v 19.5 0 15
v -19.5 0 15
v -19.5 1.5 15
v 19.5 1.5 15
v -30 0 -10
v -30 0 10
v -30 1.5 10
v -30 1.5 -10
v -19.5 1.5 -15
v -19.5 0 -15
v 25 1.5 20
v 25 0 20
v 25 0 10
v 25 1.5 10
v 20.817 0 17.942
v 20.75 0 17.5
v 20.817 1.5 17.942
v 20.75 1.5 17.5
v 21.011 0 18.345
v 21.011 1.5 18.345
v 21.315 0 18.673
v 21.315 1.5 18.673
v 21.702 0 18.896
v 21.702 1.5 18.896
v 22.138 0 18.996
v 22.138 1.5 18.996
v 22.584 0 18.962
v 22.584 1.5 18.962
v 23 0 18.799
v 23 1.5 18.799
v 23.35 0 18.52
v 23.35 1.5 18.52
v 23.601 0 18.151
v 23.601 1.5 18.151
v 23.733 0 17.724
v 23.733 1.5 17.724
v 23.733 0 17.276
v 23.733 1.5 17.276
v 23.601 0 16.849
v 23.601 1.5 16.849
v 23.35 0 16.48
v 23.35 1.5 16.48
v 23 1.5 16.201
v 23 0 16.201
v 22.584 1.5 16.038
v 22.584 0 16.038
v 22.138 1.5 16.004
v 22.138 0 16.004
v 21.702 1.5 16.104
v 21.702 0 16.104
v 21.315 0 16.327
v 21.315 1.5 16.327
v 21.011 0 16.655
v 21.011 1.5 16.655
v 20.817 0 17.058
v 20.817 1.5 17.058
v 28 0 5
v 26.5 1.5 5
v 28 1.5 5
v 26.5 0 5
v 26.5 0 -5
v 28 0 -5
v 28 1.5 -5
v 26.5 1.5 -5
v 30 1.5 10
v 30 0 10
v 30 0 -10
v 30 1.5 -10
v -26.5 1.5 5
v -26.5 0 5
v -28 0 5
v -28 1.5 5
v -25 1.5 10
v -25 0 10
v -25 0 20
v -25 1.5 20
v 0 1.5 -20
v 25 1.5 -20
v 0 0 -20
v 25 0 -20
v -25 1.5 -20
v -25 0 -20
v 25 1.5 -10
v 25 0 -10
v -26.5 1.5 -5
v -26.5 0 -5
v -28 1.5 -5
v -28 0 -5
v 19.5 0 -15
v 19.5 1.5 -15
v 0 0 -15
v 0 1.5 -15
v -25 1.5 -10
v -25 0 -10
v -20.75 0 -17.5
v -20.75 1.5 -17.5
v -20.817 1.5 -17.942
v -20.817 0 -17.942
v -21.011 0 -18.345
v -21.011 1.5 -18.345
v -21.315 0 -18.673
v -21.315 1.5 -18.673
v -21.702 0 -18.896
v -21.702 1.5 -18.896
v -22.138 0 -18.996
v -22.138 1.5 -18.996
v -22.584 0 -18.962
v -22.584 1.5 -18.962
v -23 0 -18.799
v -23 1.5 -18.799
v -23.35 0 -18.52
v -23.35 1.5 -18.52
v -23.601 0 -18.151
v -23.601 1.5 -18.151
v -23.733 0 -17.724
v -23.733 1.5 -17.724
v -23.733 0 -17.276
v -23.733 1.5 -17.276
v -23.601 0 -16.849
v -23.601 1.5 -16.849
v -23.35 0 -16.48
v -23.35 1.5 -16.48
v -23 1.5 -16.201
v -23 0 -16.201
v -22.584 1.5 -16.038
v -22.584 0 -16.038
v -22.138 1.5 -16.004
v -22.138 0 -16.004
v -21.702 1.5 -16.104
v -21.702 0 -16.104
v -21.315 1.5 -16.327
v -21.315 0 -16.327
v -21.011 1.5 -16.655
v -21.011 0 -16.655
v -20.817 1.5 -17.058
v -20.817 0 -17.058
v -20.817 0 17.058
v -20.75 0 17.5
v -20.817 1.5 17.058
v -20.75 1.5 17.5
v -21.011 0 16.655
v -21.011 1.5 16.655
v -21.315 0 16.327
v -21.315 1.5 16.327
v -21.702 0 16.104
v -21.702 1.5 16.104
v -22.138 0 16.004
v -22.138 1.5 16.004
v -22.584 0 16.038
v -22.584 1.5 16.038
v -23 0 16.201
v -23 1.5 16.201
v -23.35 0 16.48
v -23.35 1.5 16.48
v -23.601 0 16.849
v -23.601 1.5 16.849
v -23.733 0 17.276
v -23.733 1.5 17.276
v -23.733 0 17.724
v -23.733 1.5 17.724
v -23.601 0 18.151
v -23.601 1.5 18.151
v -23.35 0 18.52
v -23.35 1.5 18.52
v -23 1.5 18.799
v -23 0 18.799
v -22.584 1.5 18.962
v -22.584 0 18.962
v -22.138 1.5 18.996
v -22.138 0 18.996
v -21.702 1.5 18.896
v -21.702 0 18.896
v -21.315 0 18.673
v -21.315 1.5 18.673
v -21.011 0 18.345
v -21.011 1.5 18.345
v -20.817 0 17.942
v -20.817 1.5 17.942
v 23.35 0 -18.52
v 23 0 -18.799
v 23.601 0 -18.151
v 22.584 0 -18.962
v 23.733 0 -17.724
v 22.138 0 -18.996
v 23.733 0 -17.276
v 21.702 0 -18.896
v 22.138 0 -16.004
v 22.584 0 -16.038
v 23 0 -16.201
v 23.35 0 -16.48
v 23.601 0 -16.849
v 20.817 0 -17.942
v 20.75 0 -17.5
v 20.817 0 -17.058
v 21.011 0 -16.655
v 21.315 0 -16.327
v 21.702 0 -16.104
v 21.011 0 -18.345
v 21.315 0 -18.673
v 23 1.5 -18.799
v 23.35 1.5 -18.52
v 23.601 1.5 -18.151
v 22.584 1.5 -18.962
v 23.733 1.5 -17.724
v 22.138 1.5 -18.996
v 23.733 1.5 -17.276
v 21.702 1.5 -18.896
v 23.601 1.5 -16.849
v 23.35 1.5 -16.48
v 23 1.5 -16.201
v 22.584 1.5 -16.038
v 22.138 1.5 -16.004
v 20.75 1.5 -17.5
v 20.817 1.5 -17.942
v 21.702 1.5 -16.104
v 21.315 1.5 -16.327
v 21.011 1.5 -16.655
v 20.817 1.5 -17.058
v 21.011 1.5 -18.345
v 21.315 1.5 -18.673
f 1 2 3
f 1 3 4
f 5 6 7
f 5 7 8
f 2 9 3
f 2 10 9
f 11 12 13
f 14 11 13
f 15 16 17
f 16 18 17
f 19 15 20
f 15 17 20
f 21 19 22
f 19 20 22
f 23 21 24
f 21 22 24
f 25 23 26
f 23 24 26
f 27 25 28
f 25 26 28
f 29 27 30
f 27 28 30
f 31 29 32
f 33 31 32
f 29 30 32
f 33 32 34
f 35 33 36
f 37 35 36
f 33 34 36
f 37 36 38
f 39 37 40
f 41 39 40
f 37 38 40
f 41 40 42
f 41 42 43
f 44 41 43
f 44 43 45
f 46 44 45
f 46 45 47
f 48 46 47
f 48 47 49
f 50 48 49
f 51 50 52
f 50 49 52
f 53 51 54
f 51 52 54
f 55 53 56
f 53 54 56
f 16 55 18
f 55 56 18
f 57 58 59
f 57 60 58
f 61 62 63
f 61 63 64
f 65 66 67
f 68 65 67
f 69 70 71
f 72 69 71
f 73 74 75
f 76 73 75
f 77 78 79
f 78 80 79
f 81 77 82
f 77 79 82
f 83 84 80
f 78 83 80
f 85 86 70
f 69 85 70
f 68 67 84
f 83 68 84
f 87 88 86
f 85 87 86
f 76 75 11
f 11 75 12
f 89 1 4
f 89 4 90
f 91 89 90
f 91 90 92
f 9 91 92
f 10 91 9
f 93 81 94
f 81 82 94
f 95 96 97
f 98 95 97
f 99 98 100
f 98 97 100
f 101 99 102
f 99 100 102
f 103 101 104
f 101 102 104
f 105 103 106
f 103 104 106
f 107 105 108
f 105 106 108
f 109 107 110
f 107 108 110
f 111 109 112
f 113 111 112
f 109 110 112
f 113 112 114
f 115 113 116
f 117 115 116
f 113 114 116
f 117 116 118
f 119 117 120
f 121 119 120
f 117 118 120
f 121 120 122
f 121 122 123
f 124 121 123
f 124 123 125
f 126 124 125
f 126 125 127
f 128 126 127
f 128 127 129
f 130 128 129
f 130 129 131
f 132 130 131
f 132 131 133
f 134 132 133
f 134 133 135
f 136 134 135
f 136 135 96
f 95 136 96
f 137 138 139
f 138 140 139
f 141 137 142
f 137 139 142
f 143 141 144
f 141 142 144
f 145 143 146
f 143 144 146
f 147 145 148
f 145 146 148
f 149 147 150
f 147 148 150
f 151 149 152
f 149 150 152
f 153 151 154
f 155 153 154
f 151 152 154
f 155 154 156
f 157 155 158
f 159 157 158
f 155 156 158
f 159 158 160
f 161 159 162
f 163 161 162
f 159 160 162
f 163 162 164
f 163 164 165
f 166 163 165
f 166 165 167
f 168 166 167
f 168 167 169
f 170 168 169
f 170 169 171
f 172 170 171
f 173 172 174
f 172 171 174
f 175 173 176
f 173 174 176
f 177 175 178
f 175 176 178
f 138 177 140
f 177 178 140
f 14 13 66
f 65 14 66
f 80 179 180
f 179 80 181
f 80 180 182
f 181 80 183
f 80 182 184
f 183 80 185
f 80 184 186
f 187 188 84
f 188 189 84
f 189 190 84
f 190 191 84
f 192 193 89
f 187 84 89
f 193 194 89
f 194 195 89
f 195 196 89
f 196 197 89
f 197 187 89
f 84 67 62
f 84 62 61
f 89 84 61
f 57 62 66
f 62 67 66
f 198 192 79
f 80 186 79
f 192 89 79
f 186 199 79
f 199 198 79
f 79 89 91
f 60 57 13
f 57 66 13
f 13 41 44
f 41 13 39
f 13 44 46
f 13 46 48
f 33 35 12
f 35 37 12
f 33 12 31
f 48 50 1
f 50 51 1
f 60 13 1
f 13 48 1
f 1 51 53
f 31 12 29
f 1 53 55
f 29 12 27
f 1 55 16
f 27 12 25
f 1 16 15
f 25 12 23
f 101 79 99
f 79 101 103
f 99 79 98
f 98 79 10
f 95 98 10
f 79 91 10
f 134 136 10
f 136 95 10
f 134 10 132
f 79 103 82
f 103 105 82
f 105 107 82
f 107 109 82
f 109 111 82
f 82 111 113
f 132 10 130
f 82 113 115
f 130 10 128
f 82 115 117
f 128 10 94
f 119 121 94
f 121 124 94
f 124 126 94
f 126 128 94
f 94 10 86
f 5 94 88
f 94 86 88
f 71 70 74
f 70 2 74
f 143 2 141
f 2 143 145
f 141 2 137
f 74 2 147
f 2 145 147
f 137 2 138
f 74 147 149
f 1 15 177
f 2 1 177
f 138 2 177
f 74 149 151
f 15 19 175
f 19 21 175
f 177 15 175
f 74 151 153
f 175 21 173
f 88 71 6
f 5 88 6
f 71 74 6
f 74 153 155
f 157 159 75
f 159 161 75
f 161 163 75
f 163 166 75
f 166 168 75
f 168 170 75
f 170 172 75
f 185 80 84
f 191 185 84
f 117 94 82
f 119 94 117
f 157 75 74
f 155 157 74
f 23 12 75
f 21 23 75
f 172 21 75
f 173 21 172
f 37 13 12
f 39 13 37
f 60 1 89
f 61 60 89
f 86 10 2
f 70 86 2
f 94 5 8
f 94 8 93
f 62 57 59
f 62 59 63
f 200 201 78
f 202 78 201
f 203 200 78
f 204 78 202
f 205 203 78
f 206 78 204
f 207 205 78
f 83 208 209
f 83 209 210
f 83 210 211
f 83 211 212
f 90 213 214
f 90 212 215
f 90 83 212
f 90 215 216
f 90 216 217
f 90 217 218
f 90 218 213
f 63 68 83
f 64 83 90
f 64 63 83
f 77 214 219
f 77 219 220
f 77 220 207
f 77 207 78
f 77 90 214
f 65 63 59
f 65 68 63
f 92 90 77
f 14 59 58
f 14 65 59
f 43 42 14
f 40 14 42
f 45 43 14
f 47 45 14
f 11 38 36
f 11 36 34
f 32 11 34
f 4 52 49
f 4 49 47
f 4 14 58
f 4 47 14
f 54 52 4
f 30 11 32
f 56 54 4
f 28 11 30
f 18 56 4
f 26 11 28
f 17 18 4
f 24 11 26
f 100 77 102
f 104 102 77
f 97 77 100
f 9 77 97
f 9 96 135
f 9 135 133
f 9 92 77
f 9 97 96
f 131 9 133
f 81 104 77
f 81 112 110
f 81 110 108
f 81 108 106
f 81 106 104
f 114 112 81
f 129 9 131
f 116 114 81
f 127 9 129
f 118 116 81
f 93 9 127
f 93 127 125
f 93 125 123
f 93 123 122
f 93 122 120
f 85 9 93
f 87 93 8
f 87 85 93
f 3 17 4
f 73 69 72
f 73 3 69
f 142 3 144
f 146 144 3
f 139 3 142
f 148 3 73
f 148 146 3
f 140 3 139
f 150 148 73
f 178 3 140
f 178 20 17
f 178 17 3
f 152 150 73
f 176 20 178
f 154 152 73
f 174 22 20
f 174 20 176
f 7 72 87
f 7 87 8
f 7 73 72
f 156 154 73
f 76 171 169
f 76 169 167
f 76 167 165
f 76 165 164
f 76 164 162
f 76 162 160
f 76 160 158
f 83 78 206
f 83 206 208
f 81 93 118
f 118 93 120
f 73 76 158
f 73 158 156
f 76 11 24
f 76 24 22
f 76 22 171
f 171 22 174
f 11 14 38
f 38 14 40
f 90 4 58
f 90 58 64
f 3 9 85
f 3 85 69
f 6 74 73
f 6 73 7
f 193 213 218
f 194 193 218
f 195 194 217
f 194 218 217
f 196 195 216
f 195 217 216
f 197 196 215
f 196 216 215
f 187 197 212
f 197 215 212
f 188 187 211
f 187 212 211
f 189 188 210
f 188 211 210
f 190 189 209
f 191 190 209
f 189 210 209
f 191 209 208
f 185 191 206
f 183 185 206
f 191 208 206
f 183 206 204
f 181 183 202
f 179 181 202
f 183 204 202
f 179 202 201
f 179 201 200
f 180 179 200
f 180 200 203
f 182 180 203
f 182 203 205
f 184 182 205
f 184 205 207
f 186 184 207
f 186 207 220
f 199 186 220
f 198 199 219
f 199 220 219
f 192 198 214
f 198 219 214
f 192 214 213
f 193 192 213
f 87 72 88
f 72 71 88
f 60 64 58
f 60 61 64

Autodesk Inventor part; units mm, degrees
ref_plane "YZ Plane" through (0, 0, 0) normal (1, 0, 0) x (0, 1, 0)
sketch "Sketch1" plane through (0, 0, 0) normal (0, 1, 0) x (-1, 0, 0)
  circle A0 centre (0, 0) radius 8.5
  line L0 (19.5, 15) -> (-19.5, 15)
  line L1 (-19.5, 15) -> (-19.5, -15)
  line L2 (-19.5, -15) -> (19.5, -15)
  line L3 (19.5, -15) -> (19.5, 15)
  line L4 (19.5, 15) -> (-19.5, -15) construction
  line L5 (-19.5, 15) -> (19.5, -15) construction
  line L6 (25, 20) -> (-25, 20)
  line L7 (-25, 20) -> (-25, -20)
  line L8 (-25, -20) -> (25, -20)
  line L9 (25, -20) -> (25, 20)
  line L10 (25, 20) -> (-25, -20) construction
  line L11 (-25, 20) -> (25, -20) construction
  line L12 (-25, 0) -> (-30, 0)
  line L13 (-30, 0) -> (-30, -10)
  line L14 (-30, -10) -> (-25, -10)
  line L15 (-25, -10) -> (-25, 0)
  line L16 (-30, 0) -> (-25, 0)
  line L17 (-25, 0) -> (-25, 10)
  line L18 (-25, 10) -> (-30, 10)
  line L19 (-30, 10) -> (-30, 0)
  line L20 (-25, 10) -> (-25, 5)
  line L21 (-25, 5) -> (-26.5, 5)
  line L22 (-26.5, 5) -> (-28, 5)
  line L23 (-28, 5) -> (-28, -5)
  line L24 (-28, -5) -> (-26.5, -5)
  line L25 (-26.5, -5) -> (-26.5, 5)
  line L26 (0, 0) -> (0, -20)
  line L27 (30, 0) -> (30, -10)
  line L28 (30, -10) -> (25, -10)
  line L29 (25, 10) -> (30, 10)
  line L30 (30, 10) -> (30, 0)
  line L31 (26.5, 5) -> (28, 5)
  line L32 (28, 5) -> (28, -5)
  line L33 (28, -5) -> (26.5, -5)
  line L34 (26.5, -5) -> (26.5, 5)
  dimension "d0" = 17
  dimension "d1" = 39
  dimension "d2" = 30
  dimension "d3" = 50
  dimension "d4" = 40
  dimension "d5" = 5
  dimension "d6" = 10
  dimension "d7" = 5
  dimension "d8" = 10
  dimension "d9" = 5
  dimension "d10" = 1.5
  dimension "d11" = 1.5
  dimension "d12" = 10
extrude "Extrusion1" add sketch "Sketch1" along normal blind 1.5 contours L8 L7 L6 L9 | L14 L13 L12 L23 L24 L25 L7 | L9 L29 L30 L27 L28 | L12 L25 L21 L7 | L21 L22 L23 L12 L19 L18 L7
sketch "Sketch2" plane through (0, 1.5, 0) normal (0, 1, 0) x (1, 0, 0)
  line L0 (19.5, -15) -> (-19.5, -15) projected
  line L1 (-19.5, -15) -> (-22.25, -15)
  line L2 (-22.25, -15) -> (-22.25, -17.5)
  line L3 (-25, -20) -> (25, -20) projected
  circle A0 centre (-22.25, -17.5) radius 1.5
  point P0 (0, 0)
  dimension "d15" = 2.75
  dimension "d16" = 2.5
  dimension "d17" = 3
extrude "Extrusion2" cut sketch "Sketch2" against normal blind 1.5
ref_plane "Work Plane1" through (0, 0, 10) normal (-1, 0, 0) x (0, 0, 1)
ref_plane "Work Plane2" through (25, 0, 0) normal (0, 0, -1) x (-1, 0, 0)
mirror "Mirror1" about plane through (0, 0, 10) normal (-1, 0, 0) of "Extrusion2"
mirror "Mirror2" about plane through (25, 0, 0) normal (0, 0, -1) of "Extrusion2", "Mirror1"
ref_plane "Work Plane3" through (0, 0, 10) normal (-1, 0, 0) x (0, 0, 1)
ref_plane "Work Plane4" through (0, 0, -10) normal (1, 0, 0) x (0, 0, -1)
ref_plane "Work Plane5" through (0, 0, -10) normal (1, 0, 0) x (0, 0, -1)
properties part number "topBearingHolder"
